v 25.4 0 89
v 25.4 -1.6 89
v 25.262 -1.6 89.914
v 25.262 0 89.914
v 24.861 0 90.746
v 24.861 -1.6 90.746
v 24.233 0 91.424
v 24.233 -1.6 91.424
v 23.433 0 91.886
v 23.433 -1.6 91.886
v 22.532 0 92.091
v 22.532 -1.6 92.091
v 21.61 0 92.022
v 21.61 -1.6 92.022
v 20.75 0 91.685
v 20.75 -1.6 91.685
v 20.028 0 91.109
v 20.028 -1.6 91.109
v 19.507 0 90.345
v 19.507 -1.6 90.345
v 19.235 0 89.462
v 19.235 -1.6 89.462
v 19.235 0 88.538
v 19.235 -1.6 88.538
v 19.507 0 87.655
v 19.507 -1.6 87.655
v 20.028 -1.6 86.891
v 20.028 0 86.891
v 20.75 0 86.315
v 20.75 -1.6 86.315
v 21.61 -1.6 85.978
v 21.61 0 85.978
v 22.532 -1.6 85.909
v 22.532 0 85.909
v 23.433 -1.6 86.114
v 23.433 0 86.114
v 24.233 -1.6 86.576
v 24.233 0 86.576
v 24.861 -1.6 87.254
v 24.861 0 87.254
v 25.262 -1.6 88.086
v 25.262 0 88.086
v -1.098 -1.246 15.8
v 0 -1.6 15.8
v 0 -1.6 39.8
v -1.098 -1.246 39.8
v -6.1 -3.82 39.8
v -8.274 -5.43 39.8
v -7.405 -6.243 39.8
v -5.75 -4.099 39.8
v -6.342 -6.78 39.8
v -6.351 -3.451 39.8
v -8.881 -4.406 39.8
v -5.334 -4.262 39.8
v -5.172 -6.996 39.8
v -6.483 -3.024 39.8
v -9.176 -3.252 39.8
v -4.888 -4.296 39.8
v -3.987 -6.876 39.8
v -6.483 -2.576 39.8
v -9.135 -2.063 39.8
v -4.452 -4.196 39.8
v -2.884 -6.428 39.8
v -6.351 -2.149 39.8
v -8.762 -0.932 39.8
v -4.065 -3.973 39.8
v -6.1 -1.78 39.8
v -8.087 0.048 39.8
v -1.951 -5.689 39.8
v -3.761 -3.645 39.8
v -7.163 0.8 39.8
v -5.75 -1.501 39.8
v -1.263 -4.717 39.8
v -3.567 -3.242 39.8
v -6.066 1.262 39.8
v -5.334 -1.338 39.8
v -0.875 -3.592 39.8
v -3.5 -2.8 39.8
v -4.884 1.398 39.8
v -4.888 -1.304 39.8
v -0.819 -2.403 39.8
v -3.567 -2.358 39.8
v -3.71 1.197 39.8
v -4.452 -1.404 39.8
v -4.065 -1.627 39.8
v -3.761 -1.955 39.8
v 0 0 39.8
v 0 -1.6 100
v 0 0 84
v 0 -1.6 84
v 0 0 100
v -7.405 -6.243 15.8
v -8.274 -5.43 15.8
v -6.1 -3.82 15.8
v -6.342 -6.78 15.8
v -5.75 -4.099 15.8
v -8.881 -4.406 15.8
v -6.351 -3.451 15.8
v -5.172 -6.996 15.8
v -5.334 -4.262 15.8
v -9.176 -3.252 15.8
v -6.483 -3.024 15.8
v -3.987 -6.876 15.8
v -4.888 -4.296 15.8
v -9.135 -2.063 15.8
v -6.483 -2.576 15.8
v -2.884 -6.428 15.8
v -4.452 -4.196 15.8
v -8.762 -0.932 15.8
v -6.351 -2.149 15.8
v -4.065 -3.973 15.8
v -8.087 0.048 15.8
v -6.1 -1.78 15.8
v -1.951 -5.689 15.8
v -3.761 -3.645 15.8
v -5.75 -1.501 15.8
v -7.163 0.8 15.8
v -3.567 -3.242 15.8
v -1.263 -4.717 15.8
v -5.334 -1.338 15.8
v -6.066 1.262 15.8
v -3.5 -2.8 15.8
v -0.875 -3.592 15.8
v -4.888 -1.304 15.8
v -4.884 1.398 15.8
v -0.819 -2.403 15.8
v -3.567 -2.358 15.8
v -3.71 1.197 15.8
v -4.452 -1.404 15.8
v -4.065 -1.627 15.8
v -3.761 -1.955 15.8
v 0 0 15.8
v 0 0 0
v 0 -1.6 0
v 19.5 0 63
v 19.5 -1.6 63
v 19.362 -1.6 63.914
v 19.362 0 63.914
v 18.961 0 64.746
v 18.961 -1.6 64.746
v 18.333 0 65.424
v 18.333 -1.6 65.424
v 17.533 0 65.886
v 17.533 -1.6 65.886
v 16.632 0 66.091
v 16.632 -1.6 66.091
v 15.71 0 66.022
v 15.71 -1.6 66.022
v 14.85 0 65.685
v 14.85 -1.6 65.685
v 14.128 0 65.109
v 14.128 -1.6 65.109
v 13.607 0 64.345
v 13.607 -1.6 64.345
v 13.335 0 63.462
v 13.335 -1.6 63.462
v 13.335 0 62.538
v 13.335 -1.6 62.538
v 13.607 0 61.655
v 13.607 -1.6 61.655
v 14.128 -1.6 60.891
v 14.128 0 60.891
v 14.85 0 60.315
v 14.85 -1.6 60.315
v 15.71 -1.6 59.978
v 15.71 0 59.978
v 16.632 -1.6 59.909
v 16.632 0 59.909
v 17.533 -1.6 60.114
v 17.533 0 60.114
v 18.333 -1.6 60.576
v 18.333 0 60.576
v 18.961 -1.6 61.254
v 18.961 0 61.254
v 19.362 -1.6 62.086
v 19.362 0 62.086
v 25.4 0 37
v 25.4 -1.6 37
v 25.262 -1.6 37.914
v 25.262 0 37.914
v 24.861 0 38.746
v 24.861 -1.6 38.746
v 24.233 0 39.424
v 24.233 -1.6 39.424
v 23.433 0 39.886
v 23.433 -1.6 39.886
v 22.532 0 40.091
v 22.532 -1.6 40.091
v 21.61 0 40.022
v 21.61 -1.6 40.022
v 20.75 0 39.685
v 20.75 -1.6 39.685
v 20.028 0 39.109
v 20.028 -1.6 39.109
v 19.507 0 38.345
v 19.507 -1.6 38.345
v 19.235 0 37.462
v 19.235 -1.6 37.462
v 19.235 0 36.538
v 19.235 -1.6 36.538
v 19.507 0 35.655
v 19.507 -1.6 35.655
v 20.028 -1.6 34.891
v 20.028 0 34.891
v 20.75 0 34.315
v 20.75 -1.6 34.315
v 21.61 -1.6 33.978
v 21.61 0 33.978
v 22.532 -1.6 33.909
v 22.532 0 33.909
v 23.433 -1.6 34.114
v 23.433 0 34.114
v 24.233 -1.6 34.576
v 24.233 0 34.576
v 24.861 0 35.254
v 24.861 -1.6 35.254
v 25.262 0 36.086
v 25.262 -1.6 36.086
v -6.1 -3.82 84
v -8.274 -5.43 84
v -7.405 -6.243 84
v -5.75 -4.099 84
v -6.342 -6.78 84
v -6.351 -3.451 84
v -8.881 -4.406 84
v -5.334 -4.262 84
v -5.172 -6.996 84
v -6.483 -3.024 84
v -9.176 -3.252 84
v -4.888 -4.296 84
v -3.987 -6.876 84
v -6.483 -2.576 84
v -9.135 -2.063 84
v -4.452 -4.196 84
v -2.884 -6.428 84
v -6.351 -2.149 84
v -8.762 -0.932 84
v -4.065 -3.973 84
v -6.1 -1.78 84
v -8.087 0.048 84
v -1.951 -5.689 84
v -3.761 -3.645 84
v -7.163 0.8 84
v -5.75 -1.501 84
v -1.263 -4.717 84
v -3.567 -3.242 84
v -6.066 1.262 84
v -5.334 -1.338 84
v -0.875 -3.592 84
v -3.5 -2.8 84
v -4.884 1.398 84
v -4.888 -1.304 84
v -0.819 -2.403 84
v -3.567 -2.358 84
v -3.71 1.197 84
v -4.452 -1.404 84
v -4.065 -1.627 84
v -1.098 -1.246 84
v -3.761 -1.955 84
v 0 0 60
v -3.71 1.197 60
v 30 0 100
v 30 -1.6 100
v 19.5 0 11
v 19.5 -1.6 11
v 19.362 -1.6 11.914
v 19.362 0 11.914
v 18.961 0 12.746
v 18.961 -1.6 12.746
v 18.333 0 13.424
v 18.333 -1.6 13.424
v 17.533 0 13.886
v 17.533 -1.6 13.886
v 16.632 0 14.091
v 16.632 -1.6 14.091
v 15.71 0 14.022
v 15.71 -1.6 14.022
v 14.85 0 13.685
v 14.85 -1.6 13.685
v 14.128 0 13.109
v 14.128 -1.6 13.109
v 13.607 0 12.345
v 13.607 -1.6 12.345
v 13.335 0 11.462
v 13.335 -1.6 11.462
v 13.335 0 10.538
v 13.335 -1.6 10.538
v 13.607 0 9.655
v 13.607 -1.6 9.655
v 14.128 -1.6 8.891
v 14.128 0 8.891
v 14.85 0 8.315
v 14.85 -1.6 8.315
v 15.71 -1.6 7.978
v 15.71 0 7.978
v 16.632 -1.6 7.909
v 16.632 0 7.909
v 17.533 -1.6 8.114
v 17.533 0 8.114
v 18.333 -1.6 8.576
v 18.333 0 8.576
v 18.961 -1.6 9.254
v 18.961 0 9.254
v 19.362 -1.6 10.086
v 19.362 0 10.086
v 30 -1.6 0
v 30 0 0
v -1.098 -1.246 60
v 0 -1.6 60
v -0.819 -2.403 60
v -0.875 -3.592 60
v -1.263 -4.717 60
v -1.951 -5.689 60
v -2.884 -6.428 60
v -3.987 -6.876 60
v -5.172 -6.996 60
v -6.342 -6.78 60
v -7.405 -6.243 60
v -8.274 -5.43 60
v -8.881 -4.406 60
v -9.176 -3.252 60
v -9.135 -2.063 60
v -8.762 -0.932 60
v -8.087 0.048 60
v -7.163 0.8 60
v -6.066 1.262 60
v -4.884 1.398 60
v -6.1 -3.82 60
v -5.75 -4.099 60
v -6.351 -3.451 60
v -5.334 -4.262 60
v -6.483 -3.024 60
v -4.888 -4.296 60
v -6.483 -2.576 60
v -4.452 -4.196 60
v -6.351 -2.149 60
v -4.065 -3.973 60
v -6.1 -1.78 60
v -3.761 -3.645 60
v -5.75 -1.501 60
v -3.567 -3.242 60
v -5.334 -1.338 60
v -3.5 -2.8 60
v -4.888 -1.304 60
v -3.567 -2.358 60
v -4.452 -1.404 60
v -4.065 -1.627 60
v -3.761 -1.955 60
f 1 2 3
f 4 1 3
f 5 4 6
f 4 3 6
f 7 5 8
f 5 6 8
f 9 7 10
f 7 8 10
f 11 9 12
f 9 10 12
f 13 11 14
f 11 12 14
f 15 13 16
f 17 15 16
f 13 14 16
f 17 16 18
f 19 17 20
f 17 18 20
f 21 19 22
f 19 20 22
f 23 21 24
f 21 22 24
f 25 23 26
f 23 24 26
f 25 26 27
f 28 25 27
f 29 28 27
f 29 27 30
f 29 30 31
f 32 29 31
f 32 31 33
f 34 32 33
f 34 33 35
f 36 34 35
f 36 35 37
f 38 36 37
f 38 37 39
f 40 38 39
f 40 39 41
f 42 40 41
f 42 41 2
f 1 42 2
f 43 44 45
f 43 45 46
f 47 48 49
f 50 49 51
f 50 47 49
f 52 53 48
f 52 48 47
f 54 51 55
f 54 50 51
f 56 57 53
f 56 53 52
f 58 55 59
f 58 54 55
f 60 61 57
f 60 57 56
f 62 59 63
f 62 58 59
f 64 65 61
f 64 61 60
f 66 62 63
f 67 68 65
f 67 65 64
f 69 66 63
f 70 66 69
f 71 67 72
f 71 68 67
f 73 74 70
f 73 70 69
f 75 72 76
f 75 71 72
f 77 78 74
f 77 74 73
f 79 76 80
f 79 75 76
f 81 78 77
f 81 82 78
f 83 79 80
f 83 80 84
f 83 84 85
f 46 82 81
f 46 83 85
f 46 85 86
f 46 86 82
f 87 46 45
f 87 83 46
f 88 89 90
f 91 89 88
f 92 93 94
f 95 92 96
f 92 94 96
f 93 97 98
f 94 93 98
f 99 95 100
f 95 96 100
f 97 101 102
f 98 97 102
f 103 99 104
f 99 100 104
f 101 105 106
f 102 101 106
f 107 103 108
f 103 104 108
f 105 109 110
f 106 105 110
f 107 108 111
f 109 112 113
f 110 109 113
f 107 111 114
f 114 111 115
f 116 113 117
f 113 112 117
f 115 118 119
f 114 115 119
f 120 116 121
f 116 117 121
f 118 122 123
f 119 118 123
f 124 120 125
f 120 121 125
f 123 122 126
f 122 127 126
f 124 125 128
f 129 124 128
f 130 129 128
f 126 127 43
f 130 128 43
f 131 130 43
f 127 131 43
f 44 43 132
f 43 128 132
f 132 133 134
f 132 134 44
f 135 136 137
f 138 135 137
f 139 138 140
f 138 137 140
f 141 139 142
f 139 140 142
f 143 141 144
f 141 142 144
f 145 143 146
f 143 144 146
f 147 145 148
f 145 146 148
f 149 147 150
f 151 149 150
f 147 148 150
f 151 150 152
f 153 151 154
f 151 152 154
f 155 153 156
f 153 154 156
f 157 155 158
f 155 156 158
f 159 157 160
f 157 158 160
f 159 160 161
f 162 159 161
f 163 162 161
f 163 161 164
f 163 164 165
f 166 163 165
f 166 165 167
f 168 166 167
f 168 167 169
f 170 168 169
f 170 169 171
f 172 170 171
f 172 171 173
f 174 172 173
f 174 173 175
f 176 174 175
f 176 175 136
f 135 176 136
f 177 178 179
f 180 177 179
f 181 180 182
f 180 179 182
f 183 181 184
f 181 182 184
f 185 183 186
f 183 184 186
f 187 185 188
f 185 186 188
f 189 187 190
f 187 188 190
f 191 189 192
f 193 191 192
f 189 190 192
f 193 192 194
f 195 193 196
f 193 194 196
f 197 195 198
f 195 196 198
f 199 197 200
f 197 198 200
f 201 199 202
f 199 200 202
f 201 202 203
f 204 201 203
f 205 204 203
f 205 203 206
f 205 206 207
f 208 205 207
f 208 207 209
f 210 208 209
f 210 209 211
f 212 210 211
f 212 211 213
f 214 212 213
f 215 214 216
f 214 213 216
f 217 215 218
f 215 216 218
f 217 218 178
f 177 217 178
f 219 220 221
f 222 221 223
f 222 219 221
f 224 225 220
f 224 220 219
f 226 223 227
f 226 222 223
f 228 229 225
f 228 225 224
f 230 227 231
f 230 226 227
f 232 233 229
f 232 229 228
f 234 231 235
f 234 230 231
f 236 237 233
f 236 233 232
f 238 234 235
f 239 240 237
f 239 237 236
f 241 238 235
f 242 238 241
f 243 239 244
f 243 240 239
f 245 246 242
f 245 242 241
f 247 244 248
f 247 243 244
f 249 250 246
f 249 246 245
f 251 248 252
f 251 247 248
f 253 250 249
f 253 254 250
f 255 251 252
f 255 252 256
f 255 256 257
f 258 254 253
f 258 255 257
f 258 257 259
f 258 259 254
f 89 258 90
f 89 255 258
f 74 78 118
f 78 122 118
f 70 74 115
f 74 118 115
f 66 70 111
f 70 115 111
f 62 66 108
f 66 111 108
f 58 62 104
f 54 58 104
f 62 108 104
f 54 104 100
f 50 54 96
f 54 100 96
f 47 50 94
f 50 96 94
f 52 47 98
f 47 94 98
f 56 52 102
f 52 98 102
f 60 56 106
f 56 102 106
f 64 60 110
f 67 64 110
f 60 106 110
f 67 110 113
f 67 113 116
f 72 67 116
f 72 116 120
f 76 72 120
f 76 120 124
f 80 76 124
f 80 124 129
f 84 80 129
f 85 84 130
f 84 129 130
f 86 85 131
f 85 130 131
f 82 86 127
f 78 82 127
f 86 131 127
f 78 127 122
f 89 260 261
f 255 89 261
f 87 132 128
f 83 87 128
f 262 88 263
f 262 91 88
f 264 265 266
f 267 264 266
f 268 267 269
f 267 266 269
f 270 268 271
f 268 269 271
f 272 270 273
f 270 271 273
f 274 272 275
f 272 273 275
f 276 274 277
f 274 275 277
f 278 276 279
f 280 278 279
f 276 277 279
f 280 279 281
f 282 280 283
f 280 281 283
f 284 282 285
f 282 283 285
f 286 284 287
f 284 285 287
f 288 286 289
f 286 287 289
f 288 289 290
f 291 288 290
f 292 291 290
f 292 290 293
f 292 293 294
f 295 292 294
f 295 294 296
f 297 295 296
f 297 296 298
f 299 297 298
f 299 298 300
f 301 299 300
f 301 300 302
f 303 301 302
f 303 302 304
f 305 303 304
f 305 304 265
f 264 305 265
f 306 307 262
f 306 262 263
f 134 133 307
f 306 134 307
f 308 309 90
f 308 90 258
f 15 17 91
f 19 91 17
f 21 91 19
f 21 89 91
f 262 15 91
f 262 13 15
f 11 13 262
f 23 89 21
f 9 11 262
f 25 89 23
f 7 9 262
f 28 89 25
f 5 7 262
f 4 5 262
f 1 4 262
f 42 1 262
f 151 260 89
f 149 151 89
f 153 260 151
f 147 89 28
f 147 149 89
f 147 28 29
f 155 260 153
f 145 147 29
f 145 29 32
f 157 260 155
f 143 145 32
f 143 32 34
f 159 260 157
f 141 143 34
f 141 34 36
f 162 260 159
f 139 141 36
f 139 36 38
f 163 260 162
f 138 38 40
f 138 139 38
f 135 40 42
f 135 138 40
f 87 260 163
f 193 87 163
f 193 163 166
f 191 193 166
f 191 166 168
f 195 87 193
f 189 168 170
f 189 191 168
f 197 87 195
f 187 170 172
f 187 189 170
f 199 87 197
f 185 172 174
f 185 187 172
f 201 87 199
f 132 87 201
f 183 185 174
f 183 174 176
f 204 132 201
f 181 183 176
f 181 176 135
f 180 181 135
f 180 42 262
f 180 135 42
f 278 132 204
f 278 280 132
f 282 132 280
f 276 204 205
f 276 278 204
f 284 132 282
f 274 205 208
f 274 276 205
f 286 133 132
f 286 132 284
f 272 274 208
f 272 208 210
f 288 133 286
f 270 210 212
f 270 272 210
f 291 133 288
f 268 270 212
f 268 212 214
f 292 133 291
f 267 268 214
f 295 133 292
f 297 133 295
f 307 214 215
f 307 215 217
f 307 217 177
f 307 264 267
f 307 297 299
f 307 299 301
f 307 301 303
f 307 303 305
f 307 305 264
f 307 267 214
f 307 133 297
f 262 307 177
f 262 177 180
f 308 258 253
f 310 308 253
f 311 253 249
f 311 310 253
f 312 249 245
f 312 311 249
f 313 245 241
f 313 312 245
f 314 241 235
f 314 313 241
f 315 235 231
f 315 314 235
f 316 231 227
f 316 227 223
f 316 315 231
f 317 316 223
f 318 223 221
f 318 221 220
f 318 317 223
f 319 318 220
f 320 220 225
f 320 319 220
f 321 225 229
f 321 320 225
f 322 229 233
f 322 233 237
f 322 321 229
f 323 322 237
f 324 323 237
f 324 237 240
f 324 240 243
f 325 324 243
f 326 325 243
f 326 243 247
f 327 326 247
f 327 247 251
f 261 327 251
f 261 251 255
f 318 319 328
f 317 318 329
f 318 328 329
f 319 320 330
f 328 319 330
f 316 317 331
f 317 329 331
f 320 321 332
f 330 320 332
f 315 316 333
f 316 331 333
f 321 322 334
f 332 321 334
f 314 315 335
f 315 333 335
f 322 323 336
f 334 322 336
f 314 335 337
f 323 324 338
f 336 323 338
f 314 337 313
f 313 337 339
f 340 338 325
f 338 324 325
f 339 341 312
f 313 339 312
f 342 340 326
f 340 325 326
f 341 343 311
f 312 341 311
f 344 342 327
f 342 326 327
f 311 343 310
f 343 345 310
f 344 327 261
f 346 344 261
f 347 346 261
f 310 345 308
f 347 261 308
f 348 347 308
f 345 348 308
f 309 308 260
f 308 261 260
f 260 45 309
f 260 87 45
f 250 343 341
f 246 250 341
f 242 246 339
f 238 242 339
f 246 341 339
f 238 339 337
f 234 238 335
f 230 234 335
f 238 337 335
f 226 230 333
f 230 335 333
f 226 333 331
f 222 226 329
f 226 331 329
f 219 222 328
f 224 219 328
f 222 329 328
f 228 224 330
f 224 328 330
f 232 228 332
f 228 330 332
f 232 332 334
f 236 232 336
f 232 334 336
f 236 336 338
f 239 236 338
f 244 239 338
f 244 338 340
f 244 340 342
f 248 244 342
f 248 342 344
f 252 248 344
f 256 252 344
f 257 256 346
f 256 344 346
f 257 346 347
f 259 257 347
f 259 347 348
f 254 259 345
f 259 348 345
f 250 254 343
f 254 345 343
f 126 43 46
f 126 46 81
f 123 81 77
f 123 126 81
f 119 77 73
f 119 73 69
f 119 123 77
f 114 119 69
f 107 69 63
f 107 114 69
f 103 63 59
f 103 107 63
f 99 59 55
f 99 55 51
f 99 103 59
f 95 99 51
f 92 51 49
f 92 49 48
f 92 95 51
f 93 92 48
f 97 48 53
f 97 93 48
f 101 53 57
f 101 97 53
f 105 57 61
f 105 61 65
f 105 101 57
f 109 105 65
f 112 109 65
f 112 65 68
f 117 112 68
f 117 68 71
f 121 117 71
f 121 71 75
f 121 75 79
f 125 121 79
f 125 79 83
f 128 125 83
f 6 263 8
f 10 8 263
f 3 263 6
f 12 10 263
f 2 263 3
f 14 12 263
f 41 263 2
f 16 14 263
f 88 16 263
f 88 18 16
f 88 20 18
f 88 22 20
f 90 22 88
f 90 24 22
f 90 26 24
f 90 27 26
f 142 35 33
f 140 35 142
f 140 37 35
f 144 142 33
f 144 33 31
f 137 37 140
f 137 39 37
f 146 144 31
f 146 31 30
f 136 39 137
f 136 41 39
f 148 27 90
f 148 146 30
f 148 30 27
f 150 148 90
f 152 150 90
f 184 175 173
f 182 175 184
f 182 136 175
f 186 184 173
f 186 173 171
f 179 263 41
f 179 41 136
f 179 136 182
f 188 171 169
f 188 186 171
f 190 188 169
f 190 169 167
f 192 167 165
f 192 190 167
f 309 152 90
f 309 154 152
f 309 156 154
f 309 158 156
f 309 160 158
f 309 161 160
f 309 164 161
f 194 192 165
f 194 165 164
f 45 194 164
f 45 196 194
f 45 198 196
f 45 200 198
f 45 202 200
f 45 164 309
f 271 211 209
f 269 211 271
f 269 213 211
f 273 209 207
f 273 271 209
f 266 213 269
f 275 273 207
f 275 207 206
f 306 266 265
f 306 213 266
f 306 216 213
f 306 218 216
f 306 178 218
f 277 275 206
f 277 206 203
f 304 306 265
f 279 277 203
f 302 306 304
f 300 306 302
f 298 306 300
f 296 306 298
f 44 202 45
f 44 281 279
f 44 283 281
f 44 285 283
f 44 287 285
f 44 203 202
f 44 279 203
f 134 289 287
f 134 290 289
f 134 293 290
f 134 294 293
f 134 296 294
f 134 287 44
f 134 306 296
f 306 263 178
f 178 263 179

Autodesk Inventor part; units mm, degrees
ref_plane "YZ Plane" through (0, 0, 0) normal (1, 0, 0) x (0, 1, 0)
ref_plane "XZ Plane" through (0, 0, 0) normal (0, 1, 0) x (-1, 0, 0)
ref_plane "XY Plane" through (0, 0, 0) normal (0, 0, 1) x (1, 0, 0)
sketch "スケッチ1" plane through (0, 0, 0) normal (0, 0, 1) x (1, 0, 0)
  line L0 (0, 0) -> (30, 0)
  line L1 (30, 0) -> (30, -1.6)
  line L2 (30, -1.6) -> (0, -1.6)
  arc A0 (-3.7104, 1.1971) -> (-1.0982, -1.2457) centre (-5, -2.8) ccw
  line L3 (0, 0) -> (-3.7104, 1.1971)
  line L4 (0, -1.6) -> (-1.0982, -1.2457)
  line L5 (0, 0) -> (0, -1.6) construction
  circle A1 centre (-5, -2.8) radius 1.5
  dimension "d0" = 1.6
  dimension "d1" = 30
  dimension "d2" = 8.4
  dimension "d4" = 35
  dimension "d5" = 2.8
  dimension "d6" = 3
extrude "押し出し1" add sketch "スケッチ1" along normal blind 100
sketch "スケッチ2" plane through (0, -1.6, 0) normal (0, -1, 0) x (1, 0, 0)
  line L0 (0, 100) -> (-3.7104, 100) projected
  line L1 (0, 100) -> (-10, 100)
  line L2 (-10, -0.2) -> (0, -0.2)
  line L3 (-10, 84) -> (0, 84)
  line L4 (0, 0) -> (0, 100) projected
  line L5 (-10, 39.8) -> (0, 39.8)
  line L6 (-10, 15.8) -> (0, 15.8)
  line L7 (16.4, 101.8084) -> (16.4, 1.6084) construction
  line L8 (30, 0) -> (30, 100) construction
  line L9 (30, 89) -> (16.4, 89) construction
  line L10 (30, 63) -> (16.4, 63) construction
  line L11 (30, 37) -> (16.4, 37) construction
  line L12 (30, 11) -> (16.4, 11) construction
  line L13 (30, 100) -> (0, 100) construction
  line L14 (22.3, 100) -> (22.3, 0) construction
  circle A0 centre (22.3, 89) radius 3.1
  circle A1 centre (16.4, 63) radius 3.1
  circle A2 centre (22.3, 37) radius 3.1
  circle A3 centre (16.4, 11) radius 3.1
  line L15 (30, 0) -> (0, 0) construction
  line L16 (-10, 60) -> (0, 60)
  line L17 (-10, 100) -> (-10, 84)
  line L18 (0, 84) -> (0, 100)
  line L19 (-10, 60) -> (-10, 39.8)
  line L20 (-10, 15.8) -> (-10, -0.2)
  line L21 (0, -0.2) -> (0, 15.8)
  line L22 (0, 39.8) -> (0, 60)
  dimension "d9" = 100.2
  dimension "d10" = 10
  dimension "d11" = 16
  dimension "d12" = 16
  dimension "d13" = 24
  dimension "d15" = 7.7
  dimension "d16" = 6.2
  dimension "d17" = 11
  dimension "d19" = 11
  dimension "d20" = 13.6
  dimension "d21" = 37
  dimension "d22" = 37
  dimension "d23" = 24
extrude "押し出し2" cut sketch "スケッチ2" along normal mid plane 100.2
properties part number "蝶番1"
